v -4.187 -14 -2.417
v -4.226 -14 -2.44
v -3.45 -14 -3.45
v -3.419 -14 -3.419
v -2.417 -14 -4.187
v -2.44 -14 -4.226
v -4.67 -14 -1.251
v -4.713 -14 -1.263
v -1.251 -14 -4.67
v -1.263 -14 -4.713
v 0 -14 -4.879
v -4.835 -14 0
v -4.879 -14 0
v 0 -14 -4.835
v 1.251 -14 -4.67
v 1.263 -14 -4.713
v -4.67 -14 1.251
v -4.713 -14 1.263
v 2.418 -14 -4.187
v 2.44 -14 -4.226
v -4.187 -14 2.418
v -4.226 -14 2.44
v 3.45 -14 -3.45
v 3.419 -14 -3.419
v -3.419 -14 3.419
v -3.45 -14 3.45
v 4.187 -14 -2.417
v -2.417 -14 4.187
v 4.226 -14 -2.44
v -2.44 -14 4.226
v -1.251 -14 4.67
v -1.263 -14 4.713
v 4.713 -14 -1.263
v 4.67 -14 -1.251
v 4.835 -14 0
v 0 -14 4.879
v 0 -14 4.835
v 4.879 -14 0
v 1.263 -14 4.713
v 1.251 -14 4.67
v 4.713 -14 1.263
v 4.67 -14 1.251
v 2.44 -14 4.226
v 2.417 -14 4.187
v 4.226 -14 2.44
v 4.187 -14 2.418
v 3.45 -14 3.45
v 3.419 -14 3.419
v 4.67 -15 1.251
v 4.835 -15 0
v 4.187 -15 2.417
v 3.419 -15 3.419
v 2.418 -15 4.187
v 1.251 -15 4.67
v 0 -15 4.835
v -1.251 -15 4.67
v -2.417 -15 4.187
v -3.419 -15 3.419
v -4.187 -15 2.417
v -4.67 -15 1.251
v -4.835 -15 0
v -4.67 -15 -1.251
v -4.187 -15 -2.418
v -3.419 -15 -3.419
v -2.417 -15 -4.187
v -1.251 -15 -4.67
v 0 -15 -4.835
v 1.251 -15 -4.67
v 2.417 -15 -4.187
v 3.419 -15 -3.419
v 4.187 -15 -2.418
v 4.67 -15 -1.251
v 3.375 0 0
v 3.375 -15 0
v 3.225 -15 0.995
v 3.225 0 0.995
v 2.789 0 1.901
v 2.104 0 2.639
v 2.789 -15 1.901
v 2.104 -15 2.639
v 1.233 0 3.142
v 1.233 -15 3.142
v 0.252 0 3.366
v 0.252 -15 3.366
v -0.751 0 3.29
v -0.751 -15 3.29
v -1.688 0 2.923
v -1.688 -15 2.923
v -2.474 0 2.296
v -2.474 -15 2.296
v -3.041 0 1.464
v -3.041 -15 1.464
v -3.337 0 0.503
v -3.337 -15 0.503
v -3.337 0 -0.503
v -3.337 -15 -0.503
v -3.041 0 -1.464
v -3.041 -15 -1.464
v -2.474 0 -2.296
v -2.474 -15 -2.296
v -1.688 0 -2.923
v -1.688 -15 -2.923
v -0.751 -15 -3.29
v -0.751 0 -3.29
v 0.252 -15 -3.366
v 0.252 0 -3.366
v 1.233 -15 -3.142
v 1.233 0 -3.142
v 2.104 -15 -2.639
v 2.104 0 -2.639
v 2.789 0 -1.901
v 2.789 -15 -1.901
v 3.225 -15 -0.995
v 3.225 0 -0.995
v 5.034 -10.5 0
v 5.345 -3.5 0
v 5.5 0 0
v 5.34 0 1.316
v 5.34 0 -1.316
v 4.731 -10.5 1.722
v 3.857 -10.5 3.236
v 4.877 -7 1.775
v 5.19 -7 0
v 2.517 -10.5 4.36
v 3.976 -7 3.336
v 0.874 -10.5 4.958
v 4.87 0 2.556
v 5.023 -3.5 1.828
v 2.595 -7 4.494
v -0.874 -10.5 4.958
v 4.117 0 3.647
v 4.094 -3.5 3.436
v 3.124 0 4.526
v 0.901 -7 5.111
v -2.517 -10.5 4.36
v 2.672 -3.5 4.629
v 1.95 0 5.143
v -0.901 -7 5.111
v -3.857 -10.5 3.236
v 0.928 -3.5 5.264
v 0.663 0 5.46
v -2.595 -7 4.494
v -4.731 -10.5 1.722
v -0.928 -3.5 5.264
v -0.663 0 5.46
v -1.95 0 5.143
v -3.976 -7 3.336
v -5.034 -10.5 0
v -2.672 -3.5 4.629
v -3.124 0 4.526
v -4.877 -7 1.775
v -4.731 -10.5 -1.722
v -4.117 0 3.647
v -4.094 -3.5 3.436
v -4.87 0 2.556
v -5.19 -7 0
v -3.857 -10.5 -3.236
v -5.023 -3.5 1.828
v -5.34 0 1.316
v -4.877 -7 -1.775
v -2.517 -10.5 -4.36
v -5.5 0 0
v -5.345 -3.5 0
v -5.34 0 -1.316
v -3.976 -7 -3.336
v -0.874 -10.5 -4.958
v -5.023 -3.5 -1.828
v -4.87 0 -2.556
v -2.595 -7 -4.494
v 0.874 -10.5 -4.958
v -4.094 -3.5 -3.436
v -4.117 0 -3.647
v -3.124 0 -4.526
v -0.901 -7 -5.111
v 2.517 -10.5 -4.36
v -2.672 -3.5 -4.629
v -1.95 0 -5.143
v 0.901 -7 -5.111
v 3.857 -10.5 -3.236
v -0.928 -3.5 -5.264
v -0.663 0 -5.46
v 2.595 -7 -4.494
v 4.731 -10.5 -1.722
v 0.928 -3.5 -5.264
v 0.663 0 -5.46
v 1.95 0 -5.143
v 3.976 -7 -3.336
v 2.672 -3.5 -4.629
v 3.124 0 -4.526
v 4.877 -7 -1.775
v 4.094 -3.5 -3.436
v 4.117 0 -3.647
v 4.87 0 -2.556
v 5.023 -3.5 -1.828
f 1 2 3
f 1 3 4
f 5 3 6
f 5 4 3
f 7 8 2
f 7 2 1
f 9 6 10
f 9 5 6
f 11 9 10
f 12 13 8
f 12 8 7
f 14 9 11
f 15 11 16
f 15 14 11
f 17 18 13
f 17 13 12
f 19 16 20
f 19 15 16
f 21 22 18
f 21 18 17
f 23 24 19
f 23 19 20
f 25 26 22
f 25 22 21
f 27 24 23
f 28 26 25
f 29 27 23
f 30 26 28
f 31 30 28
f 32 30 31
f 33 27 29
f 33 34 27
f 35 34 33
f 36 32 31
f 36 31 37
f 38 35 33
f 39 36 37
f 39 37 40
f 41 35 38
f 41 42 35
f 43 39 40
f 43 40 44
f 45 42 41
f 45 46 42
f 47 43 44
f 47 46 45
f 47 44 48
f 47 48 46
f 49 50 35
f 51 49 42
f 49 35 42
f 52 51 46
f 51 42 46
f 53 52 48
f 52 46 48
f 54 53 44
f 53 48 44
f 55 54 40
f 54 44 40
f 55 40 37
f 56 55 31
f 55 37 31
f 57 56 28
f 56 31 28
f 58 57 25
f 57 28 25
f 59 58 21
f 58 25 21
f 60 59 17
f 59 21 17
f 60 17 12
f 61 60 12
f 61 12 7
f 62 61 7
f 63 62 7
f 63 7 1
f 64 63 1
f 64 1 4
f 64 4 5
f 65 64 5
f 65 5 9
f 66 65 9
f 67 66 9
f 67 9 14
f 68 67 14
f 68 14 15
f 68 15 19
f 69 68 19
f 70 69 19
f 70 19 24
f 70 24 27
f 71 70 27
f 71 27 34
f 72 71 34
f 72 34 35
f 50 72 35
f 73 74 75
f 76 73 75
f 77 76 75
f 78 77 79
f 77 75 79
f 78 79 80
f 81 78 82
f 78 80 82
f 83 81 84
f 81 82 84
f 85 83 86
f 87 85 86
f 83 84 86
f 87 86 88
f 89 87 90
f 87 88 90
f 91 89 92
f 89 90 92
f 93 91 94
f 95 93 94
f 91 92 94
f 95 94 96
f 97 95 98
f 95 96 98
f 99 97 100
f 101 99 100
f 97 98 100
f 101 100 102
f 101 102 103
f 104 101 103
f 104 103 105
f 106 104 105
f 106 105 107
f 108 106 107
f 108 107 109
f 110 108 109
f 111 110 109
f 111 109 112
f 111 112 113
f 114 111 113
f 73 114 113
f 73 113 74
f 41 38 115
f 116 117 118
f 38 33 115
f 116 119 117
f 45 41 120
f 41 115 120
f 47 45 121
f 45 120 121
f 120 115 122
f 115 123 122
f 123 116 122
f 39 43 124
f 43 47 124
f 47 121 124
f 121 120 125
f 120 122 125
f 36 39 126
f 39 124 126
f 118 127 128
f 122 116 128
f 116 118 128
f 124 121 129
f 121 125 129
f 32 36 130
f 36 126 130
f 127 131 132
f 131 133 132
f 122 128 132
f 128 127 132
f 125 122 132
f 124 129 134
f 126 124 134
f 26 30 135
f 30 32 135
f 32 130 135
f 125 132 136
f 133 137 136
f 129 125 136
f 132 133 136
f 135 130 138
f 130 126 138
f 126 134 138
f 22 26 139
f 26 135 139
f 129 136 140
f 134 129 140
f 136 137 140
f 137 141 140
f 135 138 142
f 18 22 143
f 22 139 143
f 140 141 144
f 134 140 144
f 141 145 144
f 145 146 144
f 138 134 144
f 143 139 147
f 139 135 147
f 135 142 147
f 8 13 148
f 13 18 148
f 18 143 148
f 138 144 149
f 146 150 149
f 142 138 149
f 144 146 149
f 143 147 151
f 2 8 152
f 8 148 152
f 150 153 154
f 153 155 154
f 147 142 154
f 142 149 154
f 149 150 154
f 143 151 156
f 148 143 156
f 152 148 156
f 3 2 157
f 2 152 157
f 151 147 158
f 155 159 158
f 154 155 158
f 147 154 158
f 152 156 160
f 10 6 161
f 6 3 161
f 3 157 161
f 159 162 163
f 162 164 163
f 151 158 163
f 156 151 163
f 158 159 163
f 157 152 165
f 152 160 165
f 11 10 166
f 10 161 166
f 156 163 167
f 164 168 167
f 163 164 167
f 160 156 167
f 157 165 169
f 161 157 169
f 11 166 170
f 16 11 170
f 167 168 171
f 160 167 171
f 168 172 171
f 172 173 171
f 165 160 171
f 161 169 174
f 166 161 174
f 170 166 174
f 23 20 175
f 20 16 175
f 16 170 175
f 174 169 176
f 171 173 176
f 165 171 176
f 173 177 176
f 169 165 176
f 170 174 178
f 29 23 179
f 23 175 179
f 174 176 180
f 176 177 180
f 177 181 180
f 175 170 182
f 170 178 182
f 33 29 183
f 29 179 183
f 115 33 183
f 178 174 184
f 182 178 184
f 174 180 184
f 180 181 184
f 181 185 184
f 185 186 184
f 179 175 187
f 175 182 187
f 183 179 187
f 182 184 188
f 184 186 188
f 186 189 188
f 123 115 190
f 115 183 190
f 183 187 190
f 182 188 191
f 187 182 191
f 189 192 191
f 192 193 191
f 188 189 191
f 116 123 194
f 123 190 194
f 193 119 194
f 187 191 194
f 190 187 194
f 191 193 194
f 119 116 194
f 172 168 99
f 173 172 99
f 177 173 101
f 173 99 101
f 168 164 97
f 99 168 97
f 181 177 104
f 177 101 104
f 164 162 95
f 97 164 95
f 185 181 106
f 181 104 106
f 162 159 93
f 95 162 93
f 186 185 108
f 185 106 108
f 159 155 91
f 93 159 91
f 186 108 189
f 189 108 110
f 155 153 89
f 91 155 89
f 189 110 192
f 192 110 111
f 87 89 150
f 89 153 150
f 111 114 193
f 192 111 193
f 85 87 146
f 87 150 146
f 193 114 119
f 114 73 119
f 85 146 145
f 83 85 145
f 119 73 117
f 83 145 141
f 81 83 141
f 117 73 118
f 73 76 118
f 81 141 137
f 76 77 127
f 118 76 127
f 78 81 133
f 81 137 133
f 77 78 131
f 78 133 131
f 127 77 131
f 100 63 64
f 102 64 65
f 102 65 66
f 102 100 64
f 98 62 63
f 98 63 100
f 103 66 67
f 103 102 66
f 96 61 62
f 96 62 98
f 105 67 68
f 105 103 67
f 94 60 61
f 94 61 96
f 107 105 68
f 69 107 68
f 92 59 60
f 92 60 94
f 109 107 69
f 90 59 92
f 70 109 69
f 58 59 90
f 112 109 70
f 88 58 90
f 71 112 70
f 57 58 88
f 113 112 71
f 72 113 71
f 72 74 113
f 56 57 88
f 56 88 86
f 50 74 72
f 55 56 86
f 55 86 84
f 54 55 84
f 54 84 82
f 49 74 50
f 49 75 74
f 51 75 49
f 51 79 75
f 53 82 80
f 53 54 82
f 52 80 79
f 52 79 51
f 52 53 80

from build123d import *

# Parameters (mm, degrees)
F0_R      = 5.5
F2_DEPTH  = 14
F1_R      = 4.835
F3_DEPTH  = 15
F3_FACE_R = 4.835
F2_FACE_R = 5.5
F5_R      = 3.375
F6_DEPTH  = 16


with BuildPart() as f2:
    # F0 (on Front) → F2 (new body)
    with BuildSketch(Plane.XZ):
        Circle(F0_R)
    extrude(amount=F2_DEPTH)

    # F1 (on Front) → F3 (join)
    with BuildSketch(Plane.XZ):
        Circle(F1_R)
    extrude(amount=F3_DEPTH)

    # F3_face (on face) → F4 section 0
    with BuildSketch(Plane.XZ.offset(15)):
        Circle(F3_FACE_R)
    # F2_face (on face) → F4 section 1
    with BuildSketch(Plane(origin=(0, 0, 0), x_dir=(1, 0, 0), z_dir=(0, 1, 0))):
        Circle(F2_FACE_R)
    loft(mode=Mode.INTERSECT)

    # F5 (on face) → F6 (cut)
    with BuildSketch(Plane.XZ.offset(15)):
        Circle(F5_R)
    extrude(amount=-F6_DEPTH, mode=Mode.SUBTRACT)


solid = f2.part
